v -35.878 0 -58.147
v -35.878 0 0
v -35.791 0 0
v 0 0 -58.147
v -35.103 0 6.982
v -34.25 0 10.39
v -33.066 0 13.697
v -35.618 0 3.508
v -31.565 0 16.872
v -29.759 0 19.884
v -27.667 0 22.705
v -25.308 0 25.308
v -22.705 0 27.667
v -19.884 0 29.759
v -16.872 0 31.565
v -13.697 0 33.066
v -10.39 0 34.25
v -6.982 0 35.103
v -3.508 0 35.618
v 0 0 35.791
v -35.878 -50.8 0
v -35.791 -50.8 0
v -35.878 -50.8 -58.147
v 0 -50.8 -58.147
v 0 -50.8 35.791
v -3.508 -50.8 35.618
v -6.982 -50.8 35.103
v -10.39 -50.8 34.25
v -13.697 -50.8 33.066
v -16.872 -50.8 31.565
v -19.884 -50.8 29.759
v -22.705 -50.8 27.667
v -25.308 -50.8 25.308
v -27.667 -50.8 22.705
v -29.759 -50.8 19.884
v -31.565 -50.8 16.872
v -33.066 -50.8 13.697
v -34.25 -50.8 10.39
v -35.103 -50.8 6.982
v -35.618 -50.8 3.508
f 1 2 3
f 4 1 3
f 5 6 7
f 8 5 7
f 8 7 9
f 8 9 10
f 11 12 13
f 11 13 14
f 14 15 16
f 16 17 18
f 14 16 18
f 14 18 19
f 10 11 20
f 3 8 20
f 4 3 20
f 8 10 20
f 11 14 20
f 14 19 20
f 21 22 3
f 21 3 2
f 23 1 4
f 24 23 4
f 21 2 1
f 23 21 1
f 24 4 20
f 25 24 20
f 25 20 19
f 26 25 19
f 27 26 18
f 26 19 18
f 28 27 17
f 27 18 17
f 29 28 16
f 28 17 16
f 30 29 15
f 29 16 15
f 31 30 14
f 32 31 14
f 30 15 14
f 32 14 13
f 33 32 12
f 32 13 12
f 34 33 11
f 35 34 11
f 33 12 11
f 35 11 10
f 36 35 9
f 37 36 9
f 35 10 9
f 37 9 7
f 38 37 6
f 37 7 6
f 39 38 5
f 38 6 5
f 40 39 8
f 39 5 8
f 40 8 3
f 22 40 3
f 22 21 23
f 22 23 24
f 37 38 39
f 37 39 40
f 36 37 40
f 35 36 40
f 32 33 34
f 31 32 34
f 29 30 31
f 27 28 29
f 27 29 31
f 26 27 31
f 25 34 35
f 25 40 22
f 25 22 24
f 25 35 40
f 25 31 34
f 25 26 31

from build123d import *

# Parameters (mm, degrees)
F1_DEPTH = 50.8


with BuildPart() as f1:
    # F0 (on Front) → F1 (new body)
    with BuildSketch(Plane.XZ):
        with BuildLine():
            ThreePointArc((0, 35.790812), (-25.307926, 25.307926), (-35.790812, 0))
            Line((-35.790812, 0), (0, 0))
            Line((0, 0), (0, 35.790812))
        make_face()
        Polygon((0, 0), (-35.790812, 0), (-35.877675, 0), (-35.877675, -58.146574), (0, -58.146574), align=None)
    extrude(amount=F1_DEPTH)


solid = f1.part
